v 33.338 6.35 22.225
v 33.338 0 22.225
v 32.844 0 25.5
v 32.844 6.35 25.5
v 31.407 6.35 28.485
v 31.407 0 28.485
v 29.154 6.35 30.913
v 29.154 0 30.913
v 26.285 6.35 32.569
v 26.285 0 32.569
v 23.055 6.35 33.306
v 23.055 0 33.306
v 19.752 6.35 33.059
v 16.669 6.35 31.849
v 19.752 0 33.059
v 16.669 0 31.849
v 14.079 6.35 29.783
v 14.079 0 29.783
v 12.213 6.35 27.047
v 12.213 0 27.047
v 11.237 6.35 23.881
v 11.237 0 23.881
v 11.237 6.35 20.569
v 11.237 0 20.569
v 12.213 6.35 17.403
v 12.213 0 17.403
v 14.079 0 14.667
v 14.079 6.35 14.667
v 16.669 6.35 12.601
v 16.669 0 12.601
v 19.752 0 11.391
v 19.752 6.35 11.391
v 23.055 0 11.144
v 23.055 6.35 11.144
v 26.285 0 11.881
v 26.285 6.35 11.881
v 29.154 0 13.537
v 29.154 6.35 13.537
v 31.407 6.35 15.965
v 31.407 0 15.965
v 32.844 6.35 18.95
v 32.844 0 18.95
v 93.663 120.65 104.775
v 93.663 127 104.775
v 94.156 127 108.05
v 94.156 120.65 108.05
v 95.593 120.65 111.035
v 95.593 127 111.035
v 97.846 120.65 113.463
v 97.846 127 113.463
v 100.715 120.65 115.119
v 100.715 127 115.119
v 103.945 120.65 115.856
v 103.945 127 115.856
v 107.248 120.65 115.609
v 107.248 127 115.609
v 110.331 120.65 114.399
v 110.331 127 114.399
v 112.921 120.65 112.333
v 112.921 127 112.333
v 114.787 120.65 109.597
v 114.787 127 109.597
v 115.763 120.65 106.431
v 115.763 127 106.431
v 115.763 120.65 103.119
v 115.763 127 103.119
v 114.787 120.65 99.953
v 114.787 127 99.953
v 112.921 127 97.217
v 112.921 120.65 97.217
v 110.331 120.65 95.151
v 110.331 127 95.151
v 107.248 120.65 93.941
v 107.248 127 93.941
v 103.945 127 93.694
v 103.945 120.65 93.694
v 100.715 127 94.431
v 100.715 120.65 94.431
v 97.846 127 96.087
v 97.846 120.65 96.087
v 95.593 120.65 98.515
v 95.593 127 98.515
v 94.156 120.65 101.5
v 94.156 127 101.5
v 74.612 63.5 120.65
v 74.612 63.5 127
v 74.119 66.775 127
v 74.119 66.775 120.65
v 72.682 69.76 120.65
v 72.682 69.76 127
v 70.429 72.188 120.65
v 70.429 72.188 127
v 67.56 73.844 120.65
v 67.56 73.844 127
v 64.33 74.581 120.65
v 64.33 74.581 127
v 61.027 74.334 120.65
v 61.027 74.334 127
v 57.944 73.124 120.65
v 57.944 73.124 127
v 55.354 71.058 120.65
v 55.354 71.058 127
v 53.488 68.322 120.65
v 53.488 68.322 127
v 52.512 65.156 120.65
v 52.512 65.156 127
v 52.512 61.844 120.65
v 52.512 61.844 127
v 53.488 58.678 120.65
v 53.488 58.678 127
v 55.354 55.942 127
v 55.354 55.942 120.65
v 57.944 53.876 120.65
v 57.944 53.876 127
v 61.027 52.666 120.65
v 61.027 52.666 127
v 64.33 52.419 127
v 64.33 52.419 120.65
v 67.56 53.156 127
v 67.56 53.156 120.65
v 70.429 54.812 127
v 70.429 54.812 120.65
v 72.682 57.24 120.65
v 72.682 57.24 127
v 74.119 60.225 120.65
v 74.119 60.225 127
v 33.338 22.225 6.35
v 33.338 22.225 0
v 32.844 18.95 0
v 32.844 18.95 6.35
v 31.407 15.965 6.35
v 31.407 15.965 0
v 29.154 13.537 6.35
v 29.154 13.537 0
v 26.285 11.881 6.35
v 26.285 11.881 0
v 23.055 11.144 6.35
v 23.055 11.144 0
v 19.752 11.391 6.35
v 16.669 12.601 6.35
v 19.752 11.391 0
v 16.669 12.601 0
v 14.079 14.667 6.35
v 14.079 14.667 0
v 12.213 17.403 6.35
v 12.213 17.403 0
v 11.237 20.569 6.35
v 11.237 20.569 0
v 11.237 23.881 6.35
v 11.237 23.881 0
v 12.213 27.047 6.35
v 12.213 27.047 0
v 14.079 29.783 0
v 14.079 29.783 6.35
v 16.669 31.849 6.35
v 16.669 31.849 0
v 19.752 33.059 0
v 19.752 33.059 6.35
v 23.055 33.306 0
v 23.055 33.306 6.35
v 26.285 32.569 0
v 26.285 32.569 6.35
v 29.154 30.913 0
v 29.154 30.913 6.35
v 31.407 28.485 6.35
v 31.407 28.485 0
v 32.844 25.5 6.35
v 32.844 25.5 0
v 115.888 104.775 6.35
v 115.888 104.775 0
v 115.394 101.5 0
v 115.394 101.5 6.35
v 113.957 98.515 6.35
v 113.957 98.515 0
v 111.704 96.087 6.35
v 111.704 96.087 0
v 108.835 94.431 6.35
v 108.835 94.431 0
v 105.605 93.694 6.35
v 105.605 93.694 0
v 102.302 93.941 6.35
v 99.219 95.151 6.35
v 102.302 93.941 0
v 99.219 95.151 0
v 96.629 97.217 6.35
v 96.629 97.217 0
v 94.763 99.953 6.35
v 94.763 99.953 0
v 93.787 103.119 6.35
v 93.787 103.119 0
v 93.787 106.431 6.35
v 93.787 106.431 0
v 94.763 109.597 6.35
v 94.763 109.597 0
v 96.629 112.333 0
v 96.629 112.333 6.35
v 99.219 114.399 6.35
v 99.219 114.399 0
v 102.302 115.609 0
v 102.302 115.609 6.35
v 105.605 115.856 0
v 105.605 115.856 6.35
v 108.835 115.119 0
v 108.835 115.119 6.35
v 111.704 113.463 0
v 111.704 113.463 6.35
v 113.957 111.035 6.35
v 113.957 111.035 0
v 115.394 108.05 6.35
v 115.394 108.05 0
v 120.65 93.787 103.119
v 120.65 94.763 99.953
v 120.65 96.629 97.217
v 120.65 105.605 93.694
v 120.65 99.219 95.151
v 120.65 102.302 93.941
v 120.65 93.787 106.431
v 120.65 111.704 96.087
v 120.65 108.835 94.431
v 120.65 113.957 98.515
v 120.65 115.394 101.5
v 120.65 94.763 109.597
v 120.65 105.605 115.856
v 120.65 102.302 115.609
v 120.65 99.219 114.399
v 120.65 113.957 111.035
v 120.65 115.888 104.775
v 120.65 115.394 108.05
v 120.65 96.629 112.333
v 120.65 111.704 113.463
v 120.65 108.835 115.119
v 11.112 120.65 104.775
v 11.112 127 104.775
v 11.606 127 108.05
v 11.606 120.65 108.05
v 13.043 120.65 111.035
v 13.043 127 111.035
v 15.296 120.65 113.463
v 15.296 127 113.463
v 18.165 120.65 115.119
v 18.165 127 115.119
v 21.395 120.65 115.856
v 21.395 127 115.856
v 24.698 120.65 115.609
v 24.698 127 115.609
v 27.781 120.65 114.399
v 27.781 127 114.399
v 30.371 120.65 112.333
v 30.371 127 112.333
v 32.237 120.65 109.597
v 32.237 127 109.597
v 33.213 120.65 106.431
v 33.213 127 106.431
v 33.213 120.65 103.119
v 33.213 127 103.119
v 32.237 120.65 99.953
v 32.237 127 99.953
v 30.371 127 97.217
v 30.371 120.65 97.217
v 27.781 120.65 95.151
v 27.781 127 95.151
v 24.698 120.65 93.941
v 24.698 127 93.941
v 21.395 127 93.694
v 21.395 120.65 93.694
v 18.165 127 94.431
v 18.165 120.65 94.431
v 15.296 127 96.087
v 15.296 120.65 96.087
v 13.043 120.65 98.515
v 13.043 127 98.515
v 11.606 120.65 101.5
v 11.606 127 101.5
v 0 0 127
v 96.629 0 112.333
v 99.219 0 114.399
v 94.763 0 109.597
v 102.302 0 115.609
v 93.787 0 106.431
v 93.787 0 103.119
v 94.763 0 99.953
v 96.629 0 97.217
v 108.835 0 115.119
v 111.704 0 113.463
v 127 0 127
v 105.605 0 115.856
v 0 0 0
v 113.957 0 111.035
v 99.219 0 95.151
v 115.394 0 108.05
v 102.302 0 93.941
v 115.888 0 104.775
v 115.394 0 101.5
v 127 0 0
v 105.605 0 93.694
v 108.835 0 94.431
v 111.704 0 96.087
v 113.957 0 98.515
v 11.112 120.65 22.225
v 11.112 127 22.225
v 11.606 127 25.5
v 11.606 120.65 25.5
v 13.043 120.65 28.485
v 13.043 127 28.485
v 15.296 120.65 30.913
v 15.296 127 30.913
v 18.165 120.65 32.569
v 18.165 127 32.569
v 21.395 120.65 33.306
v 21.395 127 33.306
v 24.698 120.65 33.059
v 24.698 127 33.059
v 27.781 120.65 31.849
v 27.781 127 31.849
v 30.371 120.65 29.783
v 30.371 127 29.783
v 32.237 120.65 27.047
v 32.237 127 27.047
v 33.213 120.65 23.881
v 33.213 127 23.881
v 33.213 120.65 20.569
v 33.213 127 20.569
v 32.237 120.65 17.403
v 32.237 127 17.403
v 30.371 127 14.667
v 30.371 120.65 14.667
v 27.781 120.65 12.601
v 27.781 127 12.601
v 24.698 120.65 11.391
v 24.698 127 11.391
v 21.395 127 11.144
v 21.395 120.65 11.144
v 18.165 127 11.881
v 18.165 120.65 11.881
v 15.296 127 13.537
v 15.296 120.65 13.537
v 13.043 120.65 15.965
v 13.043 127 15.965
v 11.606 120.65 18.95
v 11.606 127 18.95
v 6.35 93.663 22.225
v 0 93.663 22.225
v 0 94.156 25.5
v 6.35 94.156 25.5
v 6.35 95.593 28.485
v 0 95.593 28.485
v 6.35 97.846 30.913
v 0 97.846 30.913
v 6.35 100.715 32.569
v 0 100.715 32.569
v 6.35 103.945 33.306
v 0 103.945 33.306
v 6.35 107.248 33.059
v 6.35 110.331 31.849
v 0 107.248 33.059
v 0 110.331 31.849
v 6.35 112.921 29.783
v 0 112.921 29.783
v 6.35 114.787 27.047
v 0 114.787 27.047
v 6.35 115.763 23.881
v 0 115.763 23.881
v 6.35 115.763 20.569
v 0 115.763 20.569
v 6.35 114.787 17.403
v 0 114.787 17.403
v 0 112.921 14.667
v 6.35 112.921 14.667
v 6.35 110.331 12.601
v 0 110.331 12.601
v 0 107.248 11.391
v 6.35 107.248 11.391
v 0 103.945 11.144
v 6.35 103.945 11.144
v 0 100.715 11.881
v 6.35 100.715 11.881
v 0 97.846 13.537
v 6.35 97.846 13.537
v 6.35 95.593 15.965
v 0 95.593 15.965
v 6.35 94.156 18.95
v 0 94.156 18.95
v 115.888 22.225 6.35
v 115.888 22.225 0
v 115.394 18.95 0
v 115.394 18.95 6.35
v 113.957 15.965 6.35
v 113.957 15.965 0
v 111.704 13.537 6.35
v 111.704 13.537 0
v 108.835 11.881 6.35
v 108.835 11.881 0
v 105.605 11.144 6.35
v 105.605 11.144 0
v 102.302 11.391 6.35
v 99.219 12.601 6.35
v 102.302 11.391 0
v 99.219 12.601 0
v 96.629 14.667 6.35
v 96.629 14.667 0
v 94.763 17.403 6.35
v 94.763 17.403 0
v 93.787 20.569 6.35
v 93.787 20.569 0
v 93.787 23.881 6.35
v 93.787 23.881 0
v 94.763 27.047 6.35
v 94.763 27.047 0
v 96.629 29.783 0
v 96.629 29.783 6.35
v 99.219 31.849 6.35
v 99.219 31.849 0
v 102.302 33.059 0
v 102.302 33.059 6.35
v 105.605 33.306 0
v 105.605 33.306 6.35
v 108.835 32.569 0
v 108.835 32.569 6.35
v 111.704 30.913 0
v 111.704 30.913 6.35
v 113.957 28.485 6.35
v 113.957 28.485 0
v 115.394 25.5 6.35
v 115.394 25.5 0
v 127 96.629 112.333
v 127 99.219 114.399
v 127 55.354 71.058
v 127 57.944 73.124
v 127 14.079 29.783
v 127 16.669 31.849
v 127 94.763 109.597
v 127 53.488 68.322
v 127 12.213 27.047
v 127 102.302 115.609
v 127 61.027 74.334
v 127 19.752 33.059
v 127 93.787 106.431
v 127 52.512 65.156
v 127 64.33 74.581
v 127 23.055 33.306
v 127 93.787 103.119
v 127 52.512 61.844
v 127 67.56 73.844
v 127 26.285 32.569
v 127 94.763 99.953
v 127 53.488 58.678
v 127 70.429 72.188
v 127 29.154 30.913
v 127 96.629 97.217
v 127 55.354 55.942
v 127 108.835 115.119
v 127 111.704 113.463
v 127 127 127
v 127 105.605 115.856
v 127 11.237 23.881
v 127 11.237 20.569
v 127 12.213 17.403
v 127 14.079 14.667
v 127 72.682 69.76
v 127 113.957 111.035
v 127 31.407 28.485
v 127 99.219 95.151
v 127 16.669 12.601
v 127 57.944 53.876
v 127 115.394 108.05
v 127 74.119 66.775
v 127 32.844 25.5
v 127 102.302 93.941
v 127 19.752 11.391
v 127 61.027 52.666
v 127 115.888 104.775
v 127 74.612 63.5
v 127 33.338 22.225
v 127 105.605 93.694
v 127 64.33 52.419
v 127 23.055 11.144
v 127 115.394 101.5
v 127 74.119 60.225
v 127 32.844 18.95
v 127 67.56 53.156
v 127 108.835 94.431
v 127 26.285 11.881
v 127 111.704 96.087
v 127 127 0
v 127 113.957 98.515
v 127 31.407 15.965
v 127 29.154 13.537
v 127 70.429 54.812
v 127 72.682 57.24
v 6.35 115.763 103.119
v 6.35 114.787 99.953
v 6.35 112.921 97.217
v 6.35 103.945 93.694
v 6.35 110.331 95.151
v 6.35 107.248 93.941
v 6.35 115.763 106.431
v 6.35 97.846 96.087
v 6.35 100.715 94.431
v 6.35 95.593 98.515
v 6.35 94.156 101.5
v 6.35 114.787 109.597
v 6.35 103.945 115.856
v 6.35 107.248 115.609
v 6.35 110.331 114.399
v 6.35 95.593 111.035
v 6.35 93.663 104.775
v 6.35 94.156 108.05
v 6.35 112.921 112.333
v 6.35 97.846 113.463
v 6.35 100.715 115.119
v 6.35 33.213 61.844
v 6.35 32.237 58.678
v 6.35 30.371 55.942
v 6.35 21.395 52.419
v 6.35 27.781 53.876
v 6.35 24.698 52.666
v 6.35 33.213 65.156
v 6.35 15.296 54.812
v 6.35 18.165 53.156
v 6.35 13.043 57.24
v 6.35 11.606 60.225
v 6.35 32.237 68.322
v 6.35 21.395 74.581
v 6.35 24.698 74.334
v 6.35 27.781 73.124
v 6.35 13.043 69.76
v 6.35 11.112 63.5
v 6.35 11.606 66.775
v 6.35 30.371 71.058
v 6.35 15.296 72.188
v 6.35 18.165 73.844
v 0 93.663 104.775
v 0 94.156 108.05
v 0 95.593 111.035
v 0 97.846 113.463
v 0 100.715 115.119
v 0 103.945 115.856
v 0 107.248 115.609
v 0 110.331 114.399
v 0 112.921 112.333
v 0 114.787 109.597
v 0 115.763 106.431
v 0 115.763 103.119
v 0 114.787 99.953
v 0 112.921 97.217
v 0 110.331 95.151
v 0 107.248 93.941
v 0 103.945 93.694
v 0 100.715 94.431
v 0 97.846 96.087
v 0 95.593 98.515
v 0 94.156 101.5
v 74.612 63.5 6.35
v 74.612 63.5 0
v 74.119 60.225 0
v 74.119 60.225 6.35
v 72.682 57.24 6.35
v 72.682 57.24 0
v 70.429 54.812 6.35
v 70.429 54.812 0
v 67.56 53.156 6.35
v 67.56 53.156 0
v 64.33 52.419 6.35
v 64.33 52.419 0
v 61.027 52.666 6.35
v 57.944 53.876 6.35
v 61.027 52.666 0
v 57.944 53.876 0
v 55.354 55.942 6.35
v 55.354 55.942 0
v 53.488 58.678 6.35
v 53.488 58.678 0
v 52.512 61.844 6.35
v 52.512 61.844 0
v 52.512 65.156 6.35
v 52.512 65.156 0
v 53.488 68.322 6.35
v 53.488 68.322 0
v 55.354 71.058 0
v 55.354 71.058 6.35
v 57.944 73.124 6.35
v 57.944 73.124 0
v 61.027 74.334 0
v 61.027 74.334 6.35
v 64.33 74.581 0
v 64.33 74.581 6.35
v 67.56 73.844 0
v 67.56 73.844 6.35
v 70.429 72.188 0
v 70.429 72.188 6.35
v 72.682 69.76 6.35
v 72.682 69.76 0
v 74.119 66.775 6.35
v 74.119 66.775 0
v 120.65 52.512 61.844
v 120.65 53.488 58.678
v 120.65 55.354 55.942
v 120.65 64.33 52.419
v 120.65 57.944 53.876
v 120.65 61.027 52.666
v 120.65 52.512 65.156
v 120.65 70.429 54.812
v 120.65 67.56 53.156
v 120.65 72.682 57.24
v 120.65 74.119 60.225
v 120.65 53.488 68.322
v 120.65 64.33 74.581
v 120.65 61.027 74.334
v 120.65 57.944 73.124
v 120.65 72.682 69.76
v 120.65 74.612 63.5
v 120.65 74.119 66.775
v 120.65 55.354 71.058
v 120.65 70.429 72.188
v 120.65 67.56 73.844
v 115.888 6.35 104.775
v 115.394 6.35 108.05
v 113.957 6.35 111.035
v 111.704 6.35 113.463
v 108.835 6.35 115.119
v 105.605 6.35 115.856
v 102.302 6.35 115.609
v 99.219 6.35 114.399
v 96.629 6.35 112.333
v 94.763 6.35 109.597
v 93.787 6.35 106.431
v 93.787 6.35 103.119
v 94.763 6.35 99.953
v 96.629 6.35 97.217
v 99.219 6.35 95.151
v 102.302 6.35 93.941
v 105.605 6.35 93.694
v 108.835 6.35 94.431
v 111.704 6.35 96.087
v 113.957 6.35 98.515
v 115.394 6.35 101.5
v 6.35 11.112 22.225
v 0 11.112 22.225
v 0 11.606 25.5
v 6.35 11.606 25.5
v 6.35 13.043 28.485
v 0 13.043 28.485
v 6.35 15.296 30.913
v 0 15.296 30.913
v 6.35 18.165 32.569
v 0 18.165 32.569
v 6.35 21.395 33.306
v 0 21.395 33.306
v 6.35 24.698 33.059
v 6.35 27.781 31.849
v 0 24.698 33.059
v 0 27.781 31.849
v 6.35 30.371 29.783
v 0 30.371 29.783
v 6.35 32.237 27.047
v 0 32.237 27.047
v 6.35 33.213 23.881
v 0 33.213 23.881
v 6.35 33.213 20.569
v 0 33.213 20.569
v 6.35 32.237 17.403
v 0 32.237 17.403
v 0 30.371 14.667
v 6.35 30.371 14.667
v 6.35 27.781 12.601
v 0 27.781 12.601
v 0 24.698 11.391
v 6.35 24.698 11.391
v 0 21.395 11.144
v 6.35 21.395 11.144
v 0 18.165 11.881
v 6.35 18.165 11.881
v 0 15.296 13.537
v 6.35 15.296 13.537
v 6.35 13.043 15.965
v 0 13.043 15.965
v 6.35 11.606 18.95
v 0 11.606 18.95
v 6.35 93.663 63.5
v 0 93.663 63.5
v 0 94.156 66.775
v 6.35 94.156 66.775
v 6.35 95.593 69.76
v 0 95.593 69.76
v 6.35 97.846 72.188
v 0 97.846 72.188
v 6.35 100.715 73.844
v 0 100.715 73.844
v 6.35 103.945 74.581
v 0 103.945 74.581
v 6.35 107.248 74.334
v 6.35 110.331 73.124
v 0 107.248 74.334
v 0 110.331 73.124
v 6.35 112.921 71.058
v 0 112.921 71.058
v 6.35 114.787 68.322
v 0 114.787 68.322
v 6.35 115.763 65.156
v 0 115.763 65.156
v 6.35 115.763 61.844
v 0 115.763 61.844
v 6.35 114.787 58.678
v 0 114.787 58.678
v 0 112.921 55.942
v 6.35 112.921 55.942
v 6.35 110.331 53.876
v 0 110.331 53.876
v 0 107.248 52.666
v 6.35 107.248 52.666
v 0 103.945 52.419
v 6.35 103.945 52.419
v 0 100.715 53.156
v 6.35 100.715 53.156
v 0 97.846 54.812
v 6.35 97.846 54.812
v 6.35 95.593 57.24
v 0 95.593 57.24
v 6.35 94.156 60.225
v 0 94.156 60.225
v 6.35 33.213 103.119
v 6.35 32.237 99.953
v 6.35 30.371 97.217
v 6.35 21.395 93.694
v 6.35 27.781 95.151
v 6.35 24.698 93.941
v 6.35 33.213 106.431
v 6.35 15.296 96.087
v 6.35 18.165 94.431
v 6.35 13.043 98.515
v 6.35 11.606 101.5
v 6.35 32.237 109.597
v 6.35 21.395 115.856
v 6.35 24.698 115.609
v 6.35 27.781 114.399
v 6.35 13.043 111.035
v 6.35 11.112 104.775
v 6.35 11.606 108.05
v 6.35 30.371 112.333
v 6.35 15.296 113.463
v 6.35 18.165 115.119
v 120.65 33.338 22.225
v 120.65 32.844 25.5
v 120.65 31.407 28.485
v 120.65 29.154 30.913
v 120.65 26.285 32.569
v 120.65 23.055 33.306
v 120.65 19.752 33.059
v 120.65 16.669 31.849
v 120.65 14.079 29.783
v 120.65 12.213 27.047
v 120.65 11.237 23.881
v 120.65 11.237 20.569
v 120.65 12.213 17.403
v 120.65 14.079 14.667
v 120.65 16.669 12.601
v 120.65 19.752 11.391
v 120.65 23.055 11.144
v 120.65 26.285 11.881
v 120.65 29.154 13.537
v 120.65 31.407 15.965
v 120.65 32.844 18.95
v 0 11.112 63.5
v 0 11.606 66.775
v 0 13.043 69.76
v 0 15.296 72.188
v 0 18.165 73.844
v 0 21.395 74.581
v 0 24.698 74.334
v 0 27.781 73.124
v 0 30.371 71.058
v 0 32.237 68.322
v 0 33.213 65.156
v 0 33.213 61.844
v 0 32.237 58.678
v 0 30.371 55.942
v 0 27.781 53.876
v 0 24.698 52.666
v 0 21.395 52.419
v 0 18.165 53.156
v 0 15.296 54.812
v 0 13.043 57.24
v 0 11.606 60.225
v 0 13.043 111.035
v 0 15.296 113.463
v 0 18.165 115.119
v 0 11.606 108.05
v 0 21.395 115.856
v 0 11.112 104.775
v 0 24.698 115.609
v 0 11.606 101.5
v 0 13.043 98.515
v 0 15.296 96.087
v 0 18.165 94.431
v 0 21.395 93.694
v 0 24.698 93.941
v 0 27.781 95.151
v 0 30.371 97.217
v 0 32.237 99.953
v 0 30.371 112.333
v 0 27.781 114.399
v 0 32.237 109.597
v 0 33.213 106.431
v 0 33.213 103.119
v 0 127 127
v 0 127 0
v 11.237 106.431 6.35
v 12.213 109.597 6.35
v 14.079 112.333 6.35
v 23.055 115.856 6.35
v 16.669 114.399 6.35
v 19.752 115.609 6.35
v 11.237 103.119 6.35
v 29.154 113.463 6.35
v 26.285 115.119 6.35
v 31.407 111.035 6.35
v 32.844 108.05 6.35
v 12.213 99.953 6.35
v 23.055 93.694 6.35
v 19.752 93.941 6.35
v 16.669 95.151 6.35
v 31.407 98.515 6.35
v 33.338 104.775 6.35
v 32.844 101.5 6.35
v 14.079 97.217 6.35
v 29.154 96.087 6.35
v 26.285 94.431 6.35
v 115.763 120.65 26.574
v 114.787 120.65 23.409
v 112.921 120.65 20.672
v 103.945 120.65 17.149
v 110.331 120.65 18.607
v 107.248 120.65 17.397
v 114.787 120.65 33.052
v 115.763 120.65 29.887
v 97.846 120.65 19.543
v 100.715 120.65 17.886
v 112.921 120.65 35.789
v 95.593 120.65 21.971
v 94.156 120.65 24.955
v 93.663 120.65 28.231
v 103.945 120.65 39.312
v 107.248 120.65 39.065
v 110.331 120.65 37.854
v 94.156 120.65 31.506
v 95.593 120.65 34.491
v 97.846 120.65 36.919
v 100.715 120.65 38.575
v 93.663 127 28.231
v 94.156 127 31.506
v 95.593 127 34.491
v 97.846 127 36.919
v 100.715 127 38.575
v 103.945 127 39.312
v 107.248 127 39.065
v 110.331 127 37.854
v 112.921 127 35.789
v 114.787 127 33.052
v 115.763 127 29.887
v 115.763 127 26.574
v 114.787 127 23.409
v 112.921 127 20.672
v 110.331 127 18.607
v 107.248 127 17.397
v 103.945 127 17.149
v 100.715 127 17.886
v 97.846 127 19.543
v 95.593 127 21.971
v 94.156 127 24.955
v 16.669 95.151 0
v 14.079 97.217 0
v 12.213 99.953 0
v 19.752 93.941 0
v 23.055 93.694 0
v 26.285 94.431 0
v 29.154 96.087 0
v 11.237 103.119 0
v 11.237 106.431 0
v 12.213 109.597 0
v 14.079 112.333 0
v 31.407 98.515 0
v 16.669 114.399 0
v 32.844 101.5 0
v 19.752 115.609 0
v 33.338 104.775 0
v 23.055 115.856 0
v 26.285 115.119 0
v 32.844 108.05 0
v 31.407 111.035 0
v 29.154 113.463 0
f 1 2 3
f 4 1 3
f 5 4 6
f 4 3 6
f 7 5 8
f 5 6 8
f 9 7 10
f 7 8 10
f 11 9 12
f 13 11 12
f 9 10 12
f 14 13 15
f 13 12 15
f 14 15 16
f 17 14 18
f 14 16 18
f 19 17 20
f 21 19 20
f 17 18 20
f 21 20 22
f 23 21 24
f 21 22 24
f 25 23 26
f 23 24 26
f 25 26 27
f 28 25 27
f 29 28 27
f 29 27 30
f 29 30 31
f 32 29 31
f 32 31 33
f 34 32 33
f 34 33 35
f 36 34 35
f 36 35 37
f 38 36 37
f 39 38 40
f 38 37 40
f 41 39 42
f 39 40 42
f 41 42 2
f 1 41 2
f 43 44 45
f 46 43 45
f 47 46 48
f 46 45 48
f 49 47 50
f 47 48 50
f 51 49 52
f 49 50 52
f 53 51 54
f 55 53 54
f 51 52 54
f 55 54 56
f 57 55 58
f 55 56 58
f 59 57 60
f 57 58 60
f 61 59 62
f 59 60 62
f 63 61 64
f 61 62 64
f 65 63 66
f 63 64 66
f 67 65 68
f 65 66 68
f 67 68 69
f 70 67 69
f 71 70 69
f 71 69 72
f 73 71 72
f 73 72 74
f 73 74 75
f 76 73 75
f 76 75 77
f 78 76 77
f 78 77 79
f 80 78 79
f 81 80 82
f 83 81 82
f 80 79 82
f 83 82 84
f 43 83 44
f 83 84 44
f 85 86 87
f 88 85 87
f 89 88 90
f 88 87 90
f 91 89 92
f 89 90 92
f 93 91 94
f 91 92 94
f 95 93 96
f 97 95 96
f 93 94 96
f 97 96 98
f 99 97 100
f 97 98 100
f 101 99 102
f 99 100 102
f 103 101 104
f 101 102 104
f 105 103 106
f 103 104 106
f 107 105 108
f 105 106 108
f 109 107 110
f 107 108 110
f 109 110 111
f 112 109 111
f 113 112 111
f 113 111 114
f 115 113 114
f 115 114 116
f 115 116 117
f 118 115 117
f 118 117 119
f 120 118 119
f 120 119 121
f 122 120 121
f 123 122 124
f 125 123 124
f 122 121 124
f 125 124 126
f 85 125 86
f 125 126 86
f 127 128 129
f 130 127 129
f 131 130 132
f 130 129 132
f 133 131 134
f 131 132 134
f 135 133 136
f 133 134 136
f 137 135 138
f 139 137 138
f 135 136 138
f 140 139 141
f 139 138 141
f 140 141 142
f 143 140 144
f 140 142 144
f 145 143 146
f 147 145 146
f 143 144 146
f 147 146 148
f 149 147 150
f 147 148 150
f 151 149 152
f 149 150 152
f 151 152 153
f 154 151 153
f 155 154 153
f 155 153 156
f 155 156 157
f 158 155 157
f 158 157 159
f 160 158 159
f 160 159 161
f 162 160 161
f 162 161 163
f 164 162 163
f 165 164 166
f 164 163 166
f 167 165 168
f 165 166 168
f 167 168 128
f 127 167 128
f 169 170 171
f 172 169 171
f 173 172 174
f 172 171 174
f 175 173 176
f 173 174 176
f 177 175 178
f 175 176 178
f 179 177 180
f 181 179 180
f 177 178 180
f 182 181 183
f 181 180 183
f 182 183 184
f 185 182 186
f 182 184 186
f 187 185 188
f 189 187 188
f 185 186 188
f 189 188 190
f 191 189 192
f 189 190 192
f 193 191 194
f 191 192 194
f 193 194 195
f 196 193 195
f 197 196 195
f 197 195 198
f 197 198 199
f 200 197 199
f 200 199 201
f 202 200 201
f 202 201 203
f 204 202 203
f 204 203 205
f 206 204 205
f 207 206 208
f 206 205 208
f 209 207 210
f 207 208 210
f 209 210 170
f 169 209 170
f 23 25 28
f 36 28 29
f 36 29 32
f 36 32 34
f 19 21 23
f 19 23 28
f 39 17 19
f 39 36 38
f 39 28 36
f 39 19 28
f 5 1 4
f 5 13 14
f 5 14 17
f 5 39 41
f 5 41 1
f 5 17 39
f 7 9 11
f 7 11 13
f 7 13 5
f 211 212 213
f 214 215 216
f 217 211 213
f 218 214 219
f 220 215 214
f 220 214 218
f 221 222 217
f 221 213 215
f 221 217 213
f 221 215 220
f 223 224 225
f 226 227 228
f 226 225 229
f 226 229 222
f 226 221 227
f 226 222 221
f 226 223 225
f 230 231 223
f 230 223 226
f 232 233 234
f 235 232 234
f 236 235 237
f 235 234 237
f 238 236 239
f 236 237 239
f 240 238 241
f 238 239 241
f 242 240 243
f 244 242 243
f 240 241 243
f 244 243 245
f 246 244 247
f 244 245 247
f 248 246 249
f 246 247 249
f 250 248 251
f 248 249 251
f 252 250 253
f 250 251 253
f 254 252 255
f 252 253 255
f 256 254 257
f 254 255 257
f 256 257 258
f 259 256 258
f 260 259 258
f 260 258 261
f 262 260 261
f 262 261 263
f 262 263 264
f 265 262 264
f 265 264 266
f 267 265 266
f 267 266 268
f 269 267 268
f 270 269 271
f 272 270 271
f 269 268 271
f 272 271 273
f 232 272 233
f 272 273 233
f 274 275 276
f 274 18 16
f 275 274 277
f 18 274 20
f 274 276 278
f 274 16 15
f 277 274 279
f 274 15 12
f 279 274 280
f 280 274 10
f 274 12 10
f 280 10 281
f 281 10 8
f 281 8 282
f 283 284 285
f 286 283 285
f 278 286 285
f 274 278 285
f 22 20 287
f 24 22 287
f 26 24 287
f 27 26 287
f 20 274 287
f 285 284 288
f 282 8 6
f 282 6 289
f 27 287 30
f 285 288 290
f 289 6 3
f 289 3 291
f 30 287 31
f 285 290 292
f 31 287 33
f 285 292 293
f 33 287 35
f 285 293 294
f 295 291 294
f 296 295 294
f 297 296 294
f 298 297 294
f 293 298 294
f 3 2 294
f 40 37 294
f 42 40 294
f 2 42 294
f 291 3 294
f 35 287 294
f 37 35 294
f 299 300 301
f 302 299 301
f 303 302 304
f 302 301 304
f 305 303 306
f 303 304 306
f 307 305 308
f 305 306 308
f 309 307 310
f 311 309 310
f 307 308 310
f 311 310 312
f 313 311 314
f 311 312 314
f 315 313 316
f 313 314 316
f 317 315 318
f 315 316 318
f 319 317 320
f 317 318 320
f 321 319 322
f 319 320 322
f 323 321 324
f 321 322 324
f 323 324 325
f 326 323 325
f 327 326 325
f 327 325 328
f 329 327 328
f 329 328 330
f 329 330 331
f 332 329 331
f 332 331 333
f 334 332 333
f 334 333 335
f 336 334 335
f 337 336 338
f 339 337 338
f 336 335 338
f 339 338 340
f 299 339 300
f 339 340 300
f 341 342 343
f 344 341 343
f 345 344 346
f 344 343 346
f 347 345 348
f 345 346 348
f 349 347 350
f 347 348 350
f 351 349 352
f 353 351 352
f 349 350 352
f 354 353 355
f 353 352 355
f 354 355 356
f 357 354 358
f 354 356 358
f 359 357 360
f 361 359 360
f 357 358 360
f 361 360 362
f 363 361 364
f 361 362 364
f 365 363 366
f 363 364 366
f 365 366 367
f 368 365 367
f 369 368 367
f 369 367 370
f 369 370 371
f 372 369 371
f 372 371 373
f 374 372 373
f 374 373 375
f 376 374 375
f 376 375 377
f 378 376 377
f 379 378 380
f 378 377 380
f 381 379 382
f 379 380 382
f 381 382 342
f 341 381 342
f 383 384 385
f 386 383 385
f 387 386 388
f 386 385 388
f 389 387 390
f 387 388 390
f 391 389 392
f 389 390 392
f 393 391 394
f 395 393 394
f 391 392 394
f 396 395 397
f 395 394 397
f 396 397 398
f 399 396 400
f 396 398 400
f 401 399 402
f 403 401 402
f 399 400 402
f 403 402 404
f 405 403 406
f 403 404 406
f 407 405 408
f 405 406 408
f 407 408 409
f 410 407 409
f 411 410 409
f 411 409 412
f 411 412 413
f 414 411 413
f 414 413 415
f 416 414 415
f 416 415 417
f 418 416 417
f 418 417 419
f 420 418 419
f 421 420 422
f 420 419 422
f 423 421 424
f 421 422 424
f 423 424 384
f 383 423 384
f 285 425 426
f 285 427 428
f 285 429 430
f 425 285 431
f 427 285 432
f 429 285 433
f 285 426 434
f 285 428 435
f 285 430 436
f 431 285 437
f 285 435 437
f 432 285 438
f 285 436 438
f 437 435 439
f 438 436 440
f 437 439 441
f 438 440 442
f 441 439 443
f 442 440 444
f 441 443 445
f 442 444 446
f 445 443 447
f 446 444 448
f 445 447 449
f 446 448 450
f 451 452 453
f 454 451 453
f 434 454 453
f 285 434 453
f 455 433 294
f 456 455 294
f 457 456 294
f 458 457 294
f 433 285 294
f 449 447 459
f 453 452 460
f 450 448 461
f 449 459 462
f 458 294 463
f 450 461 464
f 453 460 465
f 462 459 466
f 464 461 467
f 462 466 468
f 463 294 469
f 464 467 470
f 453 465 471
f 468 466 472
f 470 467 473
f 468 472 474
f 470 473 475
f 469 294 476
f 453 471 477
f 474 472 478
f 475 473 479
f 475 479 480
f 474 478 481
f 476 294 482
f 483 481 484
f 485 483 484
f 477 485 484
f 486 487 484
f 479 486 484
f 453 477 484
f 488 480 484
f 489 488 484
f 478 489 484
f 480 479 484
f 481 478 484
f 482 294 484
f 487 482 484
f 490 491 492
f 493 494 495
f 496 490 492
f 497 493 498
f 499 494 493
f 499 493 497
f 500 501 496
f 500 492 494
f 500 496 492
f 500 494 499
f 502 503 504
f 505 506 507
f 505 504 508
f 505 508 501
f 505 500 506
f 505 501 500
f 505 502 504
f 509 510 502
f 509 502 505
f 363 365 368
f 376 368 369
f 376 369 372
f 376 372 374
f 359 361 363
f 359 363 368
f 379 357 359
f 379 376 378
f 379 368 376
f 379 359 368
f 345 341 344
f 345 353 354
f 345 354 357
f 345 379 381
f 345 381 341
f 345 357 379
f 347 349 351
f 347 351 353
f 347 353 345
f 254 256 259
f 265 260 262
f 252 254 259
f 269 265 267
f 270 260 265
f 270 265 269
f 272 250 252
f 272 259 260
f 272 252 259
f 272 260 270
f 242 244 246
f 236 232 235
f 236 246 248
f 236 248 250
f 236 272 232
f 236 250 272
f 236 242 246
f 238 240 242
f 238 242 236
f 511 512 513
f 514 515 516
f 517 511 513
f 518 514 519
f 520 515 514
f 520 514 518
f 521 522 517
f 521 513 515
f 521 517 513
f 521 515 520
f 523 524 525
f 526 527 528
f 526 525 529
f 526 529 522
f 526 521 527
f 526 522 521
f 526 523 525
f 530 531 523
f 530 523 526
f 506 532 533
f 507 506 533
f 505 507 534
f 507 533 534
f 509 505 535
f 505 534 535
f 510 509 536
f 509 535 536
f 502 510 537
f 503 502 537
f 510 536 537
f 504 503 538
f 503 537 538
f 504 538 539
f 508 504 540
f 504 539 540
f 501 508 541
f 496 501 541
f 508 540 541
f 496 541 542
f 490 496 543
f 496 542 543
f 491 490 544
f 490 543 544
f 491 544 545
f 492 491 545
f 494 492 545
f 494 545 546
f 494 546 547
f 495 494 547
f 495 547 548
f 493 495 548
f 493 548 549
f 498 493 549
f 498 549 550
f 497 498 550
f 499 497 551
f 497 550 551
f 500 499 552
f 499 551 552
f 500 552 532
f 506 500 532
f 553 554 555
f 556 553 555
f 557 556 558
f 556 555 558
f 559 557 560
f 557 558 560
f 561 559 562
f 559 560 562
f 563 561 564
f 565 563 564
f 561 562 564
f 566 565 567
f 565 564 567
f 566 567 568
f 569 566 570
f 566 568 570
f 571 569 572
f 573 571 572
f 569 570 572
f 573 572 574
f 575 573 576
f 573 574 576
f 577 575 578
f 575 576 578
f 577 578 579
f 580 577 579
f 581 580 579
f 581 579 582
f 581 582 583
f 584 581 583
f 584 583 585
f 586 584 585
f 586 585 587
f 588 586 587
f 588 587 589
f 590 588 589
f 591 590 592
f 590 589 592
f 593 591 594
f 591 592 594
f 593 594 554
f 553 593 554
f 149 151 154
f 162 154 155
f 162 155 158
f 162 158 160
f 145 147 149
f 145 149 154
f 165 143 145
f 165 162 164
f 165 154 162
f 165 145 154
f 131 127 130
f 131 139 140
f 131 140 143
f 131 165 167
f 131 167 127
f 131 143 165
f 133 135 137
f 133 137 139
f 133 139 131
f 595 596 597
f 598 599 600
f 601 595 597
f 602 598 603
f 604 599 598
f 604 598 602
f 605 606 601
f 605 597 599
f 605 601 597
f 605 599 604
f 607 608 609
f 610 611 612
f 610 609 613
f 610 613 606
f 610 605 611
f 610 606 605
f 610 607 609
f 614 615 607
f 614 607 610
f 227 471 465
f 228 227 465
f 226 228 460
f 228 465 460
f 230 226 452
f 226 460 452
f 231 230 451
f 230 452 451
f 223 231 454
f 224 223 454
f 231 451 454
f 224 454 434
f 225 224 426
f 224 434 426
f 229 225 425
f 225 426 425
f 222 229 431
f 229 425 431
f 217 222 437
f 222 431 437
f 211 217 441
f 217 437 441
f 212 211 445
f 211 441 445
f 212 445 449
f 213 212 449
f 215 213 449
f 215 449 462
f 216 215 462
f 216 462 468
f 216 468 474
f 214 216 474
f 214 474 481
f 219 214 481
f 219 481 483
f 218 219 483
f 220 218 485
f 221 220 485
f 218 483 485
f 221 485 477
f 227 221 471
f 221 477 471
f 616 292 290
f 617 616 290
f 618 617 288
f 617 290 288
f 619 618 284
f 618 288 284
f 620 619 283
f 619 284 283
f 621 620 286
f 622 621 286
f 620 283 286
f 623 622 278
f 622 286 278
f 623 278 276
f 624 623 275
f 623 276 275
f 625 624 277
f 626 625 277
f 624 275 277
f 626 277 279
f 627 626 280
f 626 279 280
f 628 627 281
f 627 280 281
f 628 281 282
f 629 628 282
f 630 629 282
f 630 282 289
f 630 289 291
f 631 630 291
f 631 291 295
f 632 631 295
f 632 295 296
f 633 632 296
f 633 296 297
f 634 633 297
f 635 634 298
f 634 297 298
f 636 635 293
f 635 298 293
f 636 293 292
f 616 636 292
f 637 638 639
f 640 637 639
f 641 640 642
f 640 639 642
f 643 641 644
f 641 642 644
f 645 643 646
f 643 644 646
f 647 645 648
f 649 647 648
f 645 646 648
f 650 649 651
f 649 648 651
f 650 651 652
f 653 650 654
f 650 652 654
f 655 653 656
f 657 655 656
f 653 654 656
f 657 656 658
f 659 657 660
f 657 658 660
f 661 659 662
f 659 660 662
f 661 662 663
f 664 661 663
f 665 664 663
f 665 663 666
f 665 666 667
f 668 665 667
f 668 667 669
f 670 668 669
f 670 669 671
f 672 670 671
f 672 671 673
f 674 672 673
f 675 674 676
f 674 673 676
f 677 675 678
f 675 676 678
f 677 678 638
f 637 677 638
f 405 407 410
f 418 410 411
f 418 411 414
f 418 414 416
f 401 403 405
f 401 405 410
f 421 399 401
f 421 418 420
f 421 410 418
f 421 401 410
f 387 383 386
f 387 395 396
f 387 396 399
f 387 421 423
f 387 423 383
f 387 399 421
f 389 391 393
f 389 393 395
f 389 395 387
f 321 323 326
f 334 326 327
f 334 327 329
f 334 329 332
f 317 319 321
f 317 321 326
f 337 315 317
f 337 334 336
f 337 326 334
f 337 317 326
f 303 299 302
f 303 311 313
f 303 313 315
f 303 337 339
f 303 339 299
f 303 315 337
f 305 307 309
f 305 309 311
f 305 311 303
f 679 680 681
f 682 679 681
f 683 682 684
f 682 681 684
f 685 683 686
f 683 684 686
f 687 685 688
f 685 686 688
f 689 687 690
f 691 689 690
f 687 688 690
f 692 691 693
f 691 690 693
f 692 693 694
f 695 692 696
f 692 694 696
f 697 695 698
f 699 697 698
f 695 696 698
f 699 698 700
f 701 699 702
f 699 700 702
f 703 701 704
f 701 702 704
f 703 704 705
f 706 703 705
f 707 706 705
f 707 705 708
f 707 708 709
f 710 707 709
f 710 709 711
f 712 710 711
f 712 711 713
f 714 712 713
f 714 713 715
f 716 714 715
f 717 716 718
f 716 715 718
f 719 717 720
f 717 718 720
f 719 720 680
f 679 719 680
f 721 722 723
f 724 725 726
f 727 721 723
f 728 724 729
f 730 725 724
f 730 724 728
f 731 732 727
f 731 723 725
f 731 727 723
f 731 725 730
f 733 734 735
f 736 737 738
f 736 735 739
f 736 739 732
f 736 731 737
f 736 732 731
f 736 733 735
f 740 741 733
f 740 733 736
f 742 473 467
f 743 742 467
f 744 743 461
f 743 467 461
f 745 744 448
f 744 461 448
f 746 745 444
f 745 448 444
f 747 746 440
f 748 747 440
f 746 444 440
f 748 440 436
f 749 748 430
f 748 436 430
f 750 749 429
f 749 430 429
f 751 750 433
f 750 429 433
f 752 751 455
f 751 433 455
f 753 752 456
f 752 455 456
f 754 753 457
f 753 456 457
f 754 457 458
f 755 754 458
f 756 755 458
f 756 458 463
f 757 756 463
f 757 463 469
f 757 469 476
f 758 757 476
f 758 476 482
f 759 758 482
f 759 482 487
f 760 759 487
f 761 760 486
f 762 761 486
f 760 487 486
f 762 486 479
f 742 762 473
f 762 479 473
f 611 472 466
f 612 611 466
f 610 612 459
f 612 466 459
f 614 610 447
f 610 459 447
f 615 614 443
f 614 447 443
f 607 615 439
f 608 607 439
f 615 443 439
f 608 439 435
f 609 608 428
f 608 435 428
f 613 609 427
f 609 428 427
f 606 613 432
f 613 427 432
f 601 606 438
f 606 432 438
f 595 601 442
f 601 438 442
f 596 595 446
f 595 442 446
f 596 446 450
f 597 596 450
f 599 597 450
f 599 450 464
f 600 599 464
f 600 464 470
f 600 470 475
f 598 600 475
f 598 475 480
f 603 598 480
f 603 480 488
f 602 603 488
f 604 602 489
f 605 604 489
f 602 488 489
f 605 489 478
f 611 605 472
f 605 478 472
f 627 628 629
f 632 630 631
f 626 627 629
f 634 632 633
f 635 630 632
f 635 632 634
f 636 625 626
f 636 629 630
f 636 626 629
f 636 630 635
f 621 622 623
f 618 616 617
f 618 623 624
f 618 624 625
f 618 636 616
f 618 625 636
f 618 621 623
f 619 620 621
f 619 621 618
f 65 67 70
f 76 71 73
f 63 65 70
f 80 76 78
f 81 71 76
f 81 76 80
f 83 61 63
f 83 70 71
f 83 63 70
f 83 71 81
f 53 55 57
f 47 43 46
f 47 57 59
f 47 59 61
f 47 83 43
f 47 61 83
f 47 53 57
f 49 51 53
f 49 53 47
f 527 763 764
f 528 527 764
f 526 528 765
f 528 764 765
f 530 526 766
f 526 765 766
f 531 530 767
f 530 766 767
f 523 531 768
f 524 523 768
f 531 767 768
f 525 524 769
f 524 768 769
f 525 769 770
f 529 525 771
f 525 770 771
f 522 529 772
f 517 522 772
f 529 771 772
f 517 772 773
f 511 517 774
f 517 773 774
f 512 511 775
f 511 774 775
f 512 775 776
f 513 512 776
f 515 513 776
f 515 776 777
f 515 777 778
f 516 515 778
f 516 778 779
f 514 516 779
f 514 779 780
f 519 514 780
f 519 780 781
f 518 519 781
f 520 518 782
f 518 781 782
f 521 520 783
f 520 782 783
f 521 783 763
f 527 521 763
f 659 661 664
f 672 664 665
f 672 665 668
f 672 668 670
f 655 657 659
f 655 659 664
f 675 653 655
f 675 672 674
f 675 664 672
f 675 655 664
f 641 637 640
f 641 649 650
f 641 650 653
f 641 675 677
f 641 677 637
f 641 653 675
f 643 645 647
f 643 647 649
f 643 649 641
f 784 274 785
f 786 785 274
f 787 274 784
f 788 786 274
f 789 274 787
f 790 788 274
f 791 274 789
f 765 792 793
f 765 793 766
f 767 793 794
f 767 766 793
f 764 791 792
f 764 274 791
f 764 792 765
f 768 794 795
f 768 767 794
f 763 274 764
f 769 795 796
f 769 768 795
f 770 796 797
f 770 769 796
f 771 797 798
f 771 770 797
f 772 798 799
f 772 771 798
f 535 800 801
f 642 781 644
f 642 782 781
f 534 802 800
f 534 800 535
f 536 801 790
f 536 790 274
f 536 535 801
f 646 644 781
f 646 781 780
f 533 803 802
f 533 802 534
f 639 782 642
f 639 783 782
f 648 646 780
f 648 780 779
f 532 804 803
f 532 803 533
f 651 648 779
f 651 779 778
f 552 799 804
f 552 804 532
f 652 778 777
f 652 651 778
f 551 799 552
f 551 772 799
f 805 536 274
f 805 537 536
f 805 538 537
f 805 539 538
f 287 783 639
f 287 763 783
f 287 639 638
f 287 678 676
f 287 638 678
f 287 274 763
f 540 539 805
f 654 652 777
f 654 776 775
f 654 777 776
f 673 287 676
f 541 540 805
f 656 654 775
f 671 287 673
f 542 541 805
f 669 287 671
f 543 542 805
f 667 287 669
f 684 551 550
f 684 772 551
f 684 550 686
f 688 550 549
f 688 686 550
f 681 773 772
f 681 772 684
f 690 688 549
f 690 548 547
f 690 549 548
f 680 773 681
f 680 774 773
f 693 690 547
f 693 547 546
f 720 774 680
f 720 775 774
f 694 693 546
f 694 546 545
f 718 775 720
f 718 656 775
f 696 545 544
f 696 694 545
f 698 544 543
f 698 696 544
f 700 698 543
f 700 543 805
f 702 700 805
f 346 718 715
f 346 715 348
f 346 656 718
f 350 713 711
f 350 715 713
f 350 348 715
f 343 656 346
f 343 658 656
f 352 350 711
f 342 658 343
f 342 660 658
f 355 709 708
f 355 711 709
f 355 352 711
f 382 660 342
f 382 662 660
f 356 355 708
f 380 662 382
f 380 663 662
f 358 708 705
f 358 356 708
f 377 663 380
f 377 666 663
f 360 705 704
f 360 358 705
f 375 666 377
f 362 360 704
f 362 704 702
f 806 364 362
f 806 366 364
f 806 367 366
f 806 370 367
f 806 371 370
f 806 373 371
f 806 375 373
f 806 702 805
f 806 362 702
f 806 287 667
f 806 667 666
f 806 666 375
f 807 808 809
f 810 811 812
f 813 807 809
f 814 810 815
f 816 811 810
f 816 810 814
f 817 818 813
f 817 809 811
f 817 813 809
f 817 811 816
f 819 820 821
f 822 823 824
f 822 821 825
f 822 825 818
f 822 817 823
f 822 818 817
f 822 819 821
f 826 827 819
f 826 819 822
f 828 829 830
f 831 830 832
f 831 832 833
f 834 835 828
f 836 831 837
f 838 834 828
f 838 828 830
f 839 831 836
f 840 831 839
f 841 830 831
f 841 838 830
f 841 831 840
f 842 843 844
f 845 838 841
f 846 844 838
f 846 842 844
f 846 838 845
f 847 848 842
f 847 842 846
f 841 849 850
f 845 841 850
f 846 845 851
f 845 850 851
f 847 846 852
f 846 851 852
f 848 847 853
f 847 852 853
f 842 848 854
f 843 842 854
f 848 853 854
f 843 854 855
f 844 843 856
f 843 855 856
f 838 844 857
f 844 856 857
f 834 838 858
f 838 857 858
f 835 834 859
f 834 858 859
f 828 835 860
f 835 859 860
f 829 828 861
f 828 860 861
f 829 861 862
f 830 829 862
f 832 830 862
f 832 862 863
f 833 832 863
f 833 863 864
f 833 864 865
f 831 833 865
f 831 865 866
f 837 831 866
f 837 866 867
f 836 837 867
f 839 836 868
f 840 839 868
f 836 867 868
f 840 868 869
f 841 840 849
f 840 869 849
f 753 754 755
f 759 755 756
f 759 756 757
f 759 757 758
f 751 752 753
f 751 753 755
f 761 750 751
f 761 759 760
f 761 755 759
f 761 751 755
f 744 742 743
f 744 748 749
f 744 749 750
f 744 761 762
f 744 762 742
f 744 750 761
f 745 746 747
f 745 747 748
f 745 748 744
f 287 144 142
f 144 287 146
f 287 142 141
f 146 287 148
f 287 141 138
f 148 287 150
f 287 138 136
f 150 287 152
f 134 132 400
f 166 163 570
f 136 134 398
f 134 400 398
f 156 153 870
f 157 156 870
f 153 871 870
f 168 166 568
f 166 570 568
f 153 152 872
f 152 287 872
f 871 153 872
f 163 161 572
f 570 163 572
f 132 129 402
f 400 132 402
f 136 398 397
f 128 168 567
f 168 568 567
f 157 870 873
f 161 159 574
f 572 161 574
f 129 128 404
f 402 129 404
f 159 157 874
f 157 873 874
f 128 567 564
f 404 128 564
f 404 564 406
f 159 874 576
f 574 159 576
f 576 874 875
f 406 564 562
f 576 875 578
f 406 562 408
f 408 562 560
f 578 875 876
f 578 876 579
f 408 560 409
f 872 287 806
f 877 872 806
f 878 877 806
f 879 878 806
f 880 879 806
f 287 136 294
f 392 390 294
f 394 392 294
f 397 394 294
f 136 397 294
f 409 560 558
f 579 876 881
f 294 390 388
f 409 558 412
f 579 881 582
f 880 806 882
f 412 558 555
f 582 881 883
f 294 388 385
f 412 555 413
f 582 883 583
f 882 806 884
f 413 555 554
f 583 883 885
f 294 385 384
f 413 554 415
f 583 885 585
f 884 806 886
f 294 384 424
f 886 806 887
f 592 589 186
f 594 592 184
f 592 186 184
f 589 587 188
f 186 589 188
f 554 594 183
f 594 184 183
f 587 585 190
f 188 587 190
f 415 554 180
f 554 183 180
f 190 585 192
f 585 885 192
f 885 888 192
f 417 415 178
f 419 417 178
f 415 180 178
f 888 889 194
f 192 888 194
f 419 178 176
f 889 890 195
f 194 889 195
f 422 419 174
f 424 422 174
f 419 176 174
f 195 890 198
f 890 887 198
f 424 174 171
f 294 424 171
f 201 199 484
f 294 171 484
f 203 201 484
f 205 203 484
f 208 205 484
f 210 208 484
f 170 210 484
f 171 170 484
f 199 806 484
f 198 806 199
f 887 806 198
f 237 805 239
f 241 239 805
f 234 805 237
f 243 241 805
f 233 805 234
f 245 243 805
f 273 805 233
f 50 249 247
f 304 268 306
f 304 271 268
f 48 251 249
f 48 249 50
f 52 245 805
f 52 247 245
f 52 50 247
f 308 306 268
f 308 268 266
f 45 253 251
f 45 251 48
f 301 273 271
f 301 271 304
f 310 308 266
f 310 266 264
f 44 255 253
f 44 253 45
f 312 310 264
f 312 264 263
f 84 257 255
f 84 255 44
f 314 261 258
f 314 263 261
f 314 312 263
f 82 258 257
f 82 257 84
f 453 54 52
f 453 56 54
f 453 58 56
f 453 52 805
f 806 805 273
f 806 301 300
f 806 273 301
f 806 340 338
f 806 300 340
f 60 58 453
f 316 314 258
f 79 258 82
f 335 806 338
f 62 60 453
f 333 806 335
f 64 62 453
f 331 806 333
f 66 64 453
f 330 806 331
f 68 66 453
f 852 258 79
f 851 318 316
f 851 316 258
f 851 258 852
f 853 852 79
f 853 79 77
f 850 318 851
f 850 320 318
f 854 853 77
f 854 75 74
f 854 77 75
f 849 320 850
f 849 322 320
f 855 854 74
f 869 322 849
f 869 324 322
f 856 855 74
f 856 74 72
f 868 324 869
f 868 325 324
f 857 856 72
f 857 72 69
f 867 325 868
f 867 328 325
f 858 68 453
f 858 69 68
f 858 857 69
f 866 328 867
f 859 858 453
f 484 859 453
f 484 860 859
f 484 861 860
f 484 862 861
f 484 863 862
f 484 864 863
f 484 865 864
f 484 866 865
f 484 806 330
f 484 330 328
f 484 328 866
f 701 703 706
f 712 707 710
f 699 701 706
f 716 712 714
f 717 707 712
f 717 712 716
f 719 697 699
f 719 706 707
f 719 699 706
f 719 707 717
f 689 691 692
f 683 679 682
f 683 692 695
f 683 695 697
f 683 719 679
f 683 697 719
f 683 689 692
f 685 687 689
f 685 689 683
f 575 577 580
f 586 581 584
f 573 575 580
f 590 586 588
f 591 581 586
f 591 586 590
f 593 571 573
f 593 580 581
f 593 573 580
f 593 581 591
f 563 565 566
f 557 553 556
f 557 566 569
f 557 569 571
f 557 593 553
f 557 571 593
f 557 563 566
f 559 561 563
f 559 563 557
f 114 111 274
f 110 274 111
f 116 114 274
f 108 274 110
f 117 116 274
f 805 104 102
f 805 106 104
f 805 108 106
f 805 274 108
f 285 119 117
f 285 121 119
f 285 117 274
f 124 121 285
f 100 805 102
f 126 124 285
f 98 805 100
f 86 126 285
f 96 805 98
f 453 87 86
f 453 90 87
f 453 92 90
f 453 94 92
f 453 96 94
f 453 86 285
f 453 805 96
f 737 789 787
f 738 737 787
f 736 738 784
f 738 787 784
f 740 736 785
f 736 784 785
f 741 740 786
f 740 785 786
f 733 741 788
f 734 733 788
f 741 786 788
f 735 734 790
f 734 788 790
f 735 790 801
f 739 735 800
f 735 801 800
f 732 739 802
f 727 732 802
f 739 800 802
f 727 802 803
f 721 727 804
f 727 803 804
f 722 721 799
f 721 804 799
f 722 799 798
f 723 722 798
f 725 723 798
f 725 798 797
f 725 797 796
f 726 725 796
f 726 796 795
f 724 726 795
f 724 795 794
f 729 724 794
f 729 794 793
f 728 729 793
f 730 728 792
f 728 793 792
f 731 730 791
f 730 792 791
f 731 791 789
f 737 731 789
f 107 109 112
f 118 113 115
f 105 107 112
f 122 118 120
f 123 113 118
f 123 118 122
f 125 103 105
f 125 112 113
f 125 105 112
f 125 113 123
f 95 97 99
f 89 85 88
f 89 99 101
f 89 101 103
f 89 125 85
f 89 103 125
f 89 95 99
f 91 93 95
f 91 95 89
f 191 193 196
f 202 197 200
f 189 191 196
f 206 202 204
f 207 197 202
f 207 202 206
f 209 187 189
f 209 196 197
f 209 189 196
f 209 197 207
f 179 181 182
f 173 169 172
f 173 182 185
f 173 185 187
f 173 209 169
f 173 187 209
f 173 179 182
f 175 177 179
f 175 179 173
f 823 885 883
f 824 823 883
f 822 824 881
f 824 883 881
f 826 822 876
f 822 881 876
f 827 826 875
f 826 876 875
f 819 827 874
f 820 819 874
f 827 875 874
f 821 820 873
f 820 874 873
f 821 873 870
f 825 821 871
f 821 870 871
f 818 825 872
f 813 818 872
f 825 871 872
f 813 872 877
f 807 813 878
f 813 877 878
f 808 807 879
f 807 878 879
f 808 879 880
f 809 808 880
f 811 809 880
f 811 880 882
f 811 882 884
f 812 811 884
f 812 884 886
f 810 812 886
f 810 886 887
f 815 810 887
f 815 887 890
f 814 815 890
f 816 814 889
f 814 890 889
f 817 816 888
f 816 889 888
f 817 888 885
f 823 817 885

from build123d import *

# Parameters (mm, degrees)
F0_W      = 127
F0_H      = 127
F1_DEPTH  = 127
F2_R      = 11.1125
F3_DEPTH  = 6.35
F4_R      = 11.1125
F5_DEPTH  = 6.35
F6_R      = 11.1125
F7_DEPTH  = 6.35
F8_R      = 11.1125
F9_DEPTH  = 6.35
F10_R     = 11.1125
F11_DEPTH = 6.35
F12_R     = 11.1125
F13_DEPTH = 6.35


with BuildPart() as f1:
    # F0 (on Top) → F1 (new body)
    with BuildSketch(Plane.XY):
        with Locations((63.5, 63.5)):
            Rectangle(F0_W, F0_H)
    extrude(amount=F1_DEPTH)

    # F2 (on face) → F3 (cut)
    with BuildSketch(Plane.XY.offset(127)):
        with Locations((63.5, 63.5)):
            Circle(F2_R)
    extrude(amount=-F3_DEPTH, mode=Mode.SUBTRACT)

    # F4 (on face) → F5 (cut)
    with BuildSketch(Plane.XZ):
        with Locations((22.225, 22.225)):
            Circle(F4_R)
        with Locations((104.775, 104.775)):
            Circle(F4_R)
    extrude(amount=-F5_DEPTH, mode=Mode.SUBTRACT)

    # F6 (on face) → F7 (cut)
    with BuildSketch(Plane.YZ.offset(127)):
        with Locations((22.225, 22.225)):
            Circle(F6_R)
        with Locations((63.5, 63.5)):
            Circle(F6_R)
        with Locations((104.775, 104.775)):
            Circle(F6_R)
    extrude(amount=-F7_DEPTH, mode=Mode.SUBTRACT)

    # F8 (on face) → F9 (cut)
    with BuildSketch(Plane(origin=(0, 127, 0), x_dir=(-1, 0, 0), z_dir=(0, 1, 0))):
        with Locations((-22.225, 104.775)):
            Circle(F8_R)
        with Locations((-104.775, 104.775)):
            Circle(F8_R)
        with Locations((-104.775, 28.230721)):
            Circle(F8_R)
        with Locations((-22.225, 22.225)):
            Circle(F8_R)
    extrude(amount=-F9_DEPTH, mode=Mode.SUBTRACT)

    # F10 (on face) → F11 (cut)
    with BuildSketch(Plane(origin=(0, 0, 0), x_dir=(1, 0, 0), z_dir=(0, 0, -1))):
        with Locations((22.225, -104.775)):
            Circle(F10_R)
        with Locations((63.5, -63.5)):
            Circle(F10_R)
        with Locations((104.775, -22.225)):
            Circle(F10_R)
        with Locations((22.225, -22.225)):
            Circle(F10_R)
        with Locations((104.775, -104.775)):
            Circle(F10_R)
    extrude(amount=-F11_DEPTH, mode=Mode.SUBTRACT)

    # F12 (on face) → F13 (cut)
    with BuildSketch(Plane(origin=(0, 0, 0), x_dir=(0, -1, 0), z_dir=(-1, 0, 0))):
        with Locations((-104.775, 104.775)):
            Circle(F12_R)
        with Locations((-104.775, 63.5)):
            Circle(F12_R)
        with Locations((-104.775, 22.225)):
            Circle(F12_R)
        with Locations((-22.225, 104.775)):
            Circle(F12_R)
        with Locations((-22.225, 63.5)):
            Circle(F12_R)
        with Locations((-22.225, 22.225)):
            Circle(F12_R)
    extrude(amount=-F13_DEPTH, mode=Mode.SUBTRACT)


solid = f1.part
